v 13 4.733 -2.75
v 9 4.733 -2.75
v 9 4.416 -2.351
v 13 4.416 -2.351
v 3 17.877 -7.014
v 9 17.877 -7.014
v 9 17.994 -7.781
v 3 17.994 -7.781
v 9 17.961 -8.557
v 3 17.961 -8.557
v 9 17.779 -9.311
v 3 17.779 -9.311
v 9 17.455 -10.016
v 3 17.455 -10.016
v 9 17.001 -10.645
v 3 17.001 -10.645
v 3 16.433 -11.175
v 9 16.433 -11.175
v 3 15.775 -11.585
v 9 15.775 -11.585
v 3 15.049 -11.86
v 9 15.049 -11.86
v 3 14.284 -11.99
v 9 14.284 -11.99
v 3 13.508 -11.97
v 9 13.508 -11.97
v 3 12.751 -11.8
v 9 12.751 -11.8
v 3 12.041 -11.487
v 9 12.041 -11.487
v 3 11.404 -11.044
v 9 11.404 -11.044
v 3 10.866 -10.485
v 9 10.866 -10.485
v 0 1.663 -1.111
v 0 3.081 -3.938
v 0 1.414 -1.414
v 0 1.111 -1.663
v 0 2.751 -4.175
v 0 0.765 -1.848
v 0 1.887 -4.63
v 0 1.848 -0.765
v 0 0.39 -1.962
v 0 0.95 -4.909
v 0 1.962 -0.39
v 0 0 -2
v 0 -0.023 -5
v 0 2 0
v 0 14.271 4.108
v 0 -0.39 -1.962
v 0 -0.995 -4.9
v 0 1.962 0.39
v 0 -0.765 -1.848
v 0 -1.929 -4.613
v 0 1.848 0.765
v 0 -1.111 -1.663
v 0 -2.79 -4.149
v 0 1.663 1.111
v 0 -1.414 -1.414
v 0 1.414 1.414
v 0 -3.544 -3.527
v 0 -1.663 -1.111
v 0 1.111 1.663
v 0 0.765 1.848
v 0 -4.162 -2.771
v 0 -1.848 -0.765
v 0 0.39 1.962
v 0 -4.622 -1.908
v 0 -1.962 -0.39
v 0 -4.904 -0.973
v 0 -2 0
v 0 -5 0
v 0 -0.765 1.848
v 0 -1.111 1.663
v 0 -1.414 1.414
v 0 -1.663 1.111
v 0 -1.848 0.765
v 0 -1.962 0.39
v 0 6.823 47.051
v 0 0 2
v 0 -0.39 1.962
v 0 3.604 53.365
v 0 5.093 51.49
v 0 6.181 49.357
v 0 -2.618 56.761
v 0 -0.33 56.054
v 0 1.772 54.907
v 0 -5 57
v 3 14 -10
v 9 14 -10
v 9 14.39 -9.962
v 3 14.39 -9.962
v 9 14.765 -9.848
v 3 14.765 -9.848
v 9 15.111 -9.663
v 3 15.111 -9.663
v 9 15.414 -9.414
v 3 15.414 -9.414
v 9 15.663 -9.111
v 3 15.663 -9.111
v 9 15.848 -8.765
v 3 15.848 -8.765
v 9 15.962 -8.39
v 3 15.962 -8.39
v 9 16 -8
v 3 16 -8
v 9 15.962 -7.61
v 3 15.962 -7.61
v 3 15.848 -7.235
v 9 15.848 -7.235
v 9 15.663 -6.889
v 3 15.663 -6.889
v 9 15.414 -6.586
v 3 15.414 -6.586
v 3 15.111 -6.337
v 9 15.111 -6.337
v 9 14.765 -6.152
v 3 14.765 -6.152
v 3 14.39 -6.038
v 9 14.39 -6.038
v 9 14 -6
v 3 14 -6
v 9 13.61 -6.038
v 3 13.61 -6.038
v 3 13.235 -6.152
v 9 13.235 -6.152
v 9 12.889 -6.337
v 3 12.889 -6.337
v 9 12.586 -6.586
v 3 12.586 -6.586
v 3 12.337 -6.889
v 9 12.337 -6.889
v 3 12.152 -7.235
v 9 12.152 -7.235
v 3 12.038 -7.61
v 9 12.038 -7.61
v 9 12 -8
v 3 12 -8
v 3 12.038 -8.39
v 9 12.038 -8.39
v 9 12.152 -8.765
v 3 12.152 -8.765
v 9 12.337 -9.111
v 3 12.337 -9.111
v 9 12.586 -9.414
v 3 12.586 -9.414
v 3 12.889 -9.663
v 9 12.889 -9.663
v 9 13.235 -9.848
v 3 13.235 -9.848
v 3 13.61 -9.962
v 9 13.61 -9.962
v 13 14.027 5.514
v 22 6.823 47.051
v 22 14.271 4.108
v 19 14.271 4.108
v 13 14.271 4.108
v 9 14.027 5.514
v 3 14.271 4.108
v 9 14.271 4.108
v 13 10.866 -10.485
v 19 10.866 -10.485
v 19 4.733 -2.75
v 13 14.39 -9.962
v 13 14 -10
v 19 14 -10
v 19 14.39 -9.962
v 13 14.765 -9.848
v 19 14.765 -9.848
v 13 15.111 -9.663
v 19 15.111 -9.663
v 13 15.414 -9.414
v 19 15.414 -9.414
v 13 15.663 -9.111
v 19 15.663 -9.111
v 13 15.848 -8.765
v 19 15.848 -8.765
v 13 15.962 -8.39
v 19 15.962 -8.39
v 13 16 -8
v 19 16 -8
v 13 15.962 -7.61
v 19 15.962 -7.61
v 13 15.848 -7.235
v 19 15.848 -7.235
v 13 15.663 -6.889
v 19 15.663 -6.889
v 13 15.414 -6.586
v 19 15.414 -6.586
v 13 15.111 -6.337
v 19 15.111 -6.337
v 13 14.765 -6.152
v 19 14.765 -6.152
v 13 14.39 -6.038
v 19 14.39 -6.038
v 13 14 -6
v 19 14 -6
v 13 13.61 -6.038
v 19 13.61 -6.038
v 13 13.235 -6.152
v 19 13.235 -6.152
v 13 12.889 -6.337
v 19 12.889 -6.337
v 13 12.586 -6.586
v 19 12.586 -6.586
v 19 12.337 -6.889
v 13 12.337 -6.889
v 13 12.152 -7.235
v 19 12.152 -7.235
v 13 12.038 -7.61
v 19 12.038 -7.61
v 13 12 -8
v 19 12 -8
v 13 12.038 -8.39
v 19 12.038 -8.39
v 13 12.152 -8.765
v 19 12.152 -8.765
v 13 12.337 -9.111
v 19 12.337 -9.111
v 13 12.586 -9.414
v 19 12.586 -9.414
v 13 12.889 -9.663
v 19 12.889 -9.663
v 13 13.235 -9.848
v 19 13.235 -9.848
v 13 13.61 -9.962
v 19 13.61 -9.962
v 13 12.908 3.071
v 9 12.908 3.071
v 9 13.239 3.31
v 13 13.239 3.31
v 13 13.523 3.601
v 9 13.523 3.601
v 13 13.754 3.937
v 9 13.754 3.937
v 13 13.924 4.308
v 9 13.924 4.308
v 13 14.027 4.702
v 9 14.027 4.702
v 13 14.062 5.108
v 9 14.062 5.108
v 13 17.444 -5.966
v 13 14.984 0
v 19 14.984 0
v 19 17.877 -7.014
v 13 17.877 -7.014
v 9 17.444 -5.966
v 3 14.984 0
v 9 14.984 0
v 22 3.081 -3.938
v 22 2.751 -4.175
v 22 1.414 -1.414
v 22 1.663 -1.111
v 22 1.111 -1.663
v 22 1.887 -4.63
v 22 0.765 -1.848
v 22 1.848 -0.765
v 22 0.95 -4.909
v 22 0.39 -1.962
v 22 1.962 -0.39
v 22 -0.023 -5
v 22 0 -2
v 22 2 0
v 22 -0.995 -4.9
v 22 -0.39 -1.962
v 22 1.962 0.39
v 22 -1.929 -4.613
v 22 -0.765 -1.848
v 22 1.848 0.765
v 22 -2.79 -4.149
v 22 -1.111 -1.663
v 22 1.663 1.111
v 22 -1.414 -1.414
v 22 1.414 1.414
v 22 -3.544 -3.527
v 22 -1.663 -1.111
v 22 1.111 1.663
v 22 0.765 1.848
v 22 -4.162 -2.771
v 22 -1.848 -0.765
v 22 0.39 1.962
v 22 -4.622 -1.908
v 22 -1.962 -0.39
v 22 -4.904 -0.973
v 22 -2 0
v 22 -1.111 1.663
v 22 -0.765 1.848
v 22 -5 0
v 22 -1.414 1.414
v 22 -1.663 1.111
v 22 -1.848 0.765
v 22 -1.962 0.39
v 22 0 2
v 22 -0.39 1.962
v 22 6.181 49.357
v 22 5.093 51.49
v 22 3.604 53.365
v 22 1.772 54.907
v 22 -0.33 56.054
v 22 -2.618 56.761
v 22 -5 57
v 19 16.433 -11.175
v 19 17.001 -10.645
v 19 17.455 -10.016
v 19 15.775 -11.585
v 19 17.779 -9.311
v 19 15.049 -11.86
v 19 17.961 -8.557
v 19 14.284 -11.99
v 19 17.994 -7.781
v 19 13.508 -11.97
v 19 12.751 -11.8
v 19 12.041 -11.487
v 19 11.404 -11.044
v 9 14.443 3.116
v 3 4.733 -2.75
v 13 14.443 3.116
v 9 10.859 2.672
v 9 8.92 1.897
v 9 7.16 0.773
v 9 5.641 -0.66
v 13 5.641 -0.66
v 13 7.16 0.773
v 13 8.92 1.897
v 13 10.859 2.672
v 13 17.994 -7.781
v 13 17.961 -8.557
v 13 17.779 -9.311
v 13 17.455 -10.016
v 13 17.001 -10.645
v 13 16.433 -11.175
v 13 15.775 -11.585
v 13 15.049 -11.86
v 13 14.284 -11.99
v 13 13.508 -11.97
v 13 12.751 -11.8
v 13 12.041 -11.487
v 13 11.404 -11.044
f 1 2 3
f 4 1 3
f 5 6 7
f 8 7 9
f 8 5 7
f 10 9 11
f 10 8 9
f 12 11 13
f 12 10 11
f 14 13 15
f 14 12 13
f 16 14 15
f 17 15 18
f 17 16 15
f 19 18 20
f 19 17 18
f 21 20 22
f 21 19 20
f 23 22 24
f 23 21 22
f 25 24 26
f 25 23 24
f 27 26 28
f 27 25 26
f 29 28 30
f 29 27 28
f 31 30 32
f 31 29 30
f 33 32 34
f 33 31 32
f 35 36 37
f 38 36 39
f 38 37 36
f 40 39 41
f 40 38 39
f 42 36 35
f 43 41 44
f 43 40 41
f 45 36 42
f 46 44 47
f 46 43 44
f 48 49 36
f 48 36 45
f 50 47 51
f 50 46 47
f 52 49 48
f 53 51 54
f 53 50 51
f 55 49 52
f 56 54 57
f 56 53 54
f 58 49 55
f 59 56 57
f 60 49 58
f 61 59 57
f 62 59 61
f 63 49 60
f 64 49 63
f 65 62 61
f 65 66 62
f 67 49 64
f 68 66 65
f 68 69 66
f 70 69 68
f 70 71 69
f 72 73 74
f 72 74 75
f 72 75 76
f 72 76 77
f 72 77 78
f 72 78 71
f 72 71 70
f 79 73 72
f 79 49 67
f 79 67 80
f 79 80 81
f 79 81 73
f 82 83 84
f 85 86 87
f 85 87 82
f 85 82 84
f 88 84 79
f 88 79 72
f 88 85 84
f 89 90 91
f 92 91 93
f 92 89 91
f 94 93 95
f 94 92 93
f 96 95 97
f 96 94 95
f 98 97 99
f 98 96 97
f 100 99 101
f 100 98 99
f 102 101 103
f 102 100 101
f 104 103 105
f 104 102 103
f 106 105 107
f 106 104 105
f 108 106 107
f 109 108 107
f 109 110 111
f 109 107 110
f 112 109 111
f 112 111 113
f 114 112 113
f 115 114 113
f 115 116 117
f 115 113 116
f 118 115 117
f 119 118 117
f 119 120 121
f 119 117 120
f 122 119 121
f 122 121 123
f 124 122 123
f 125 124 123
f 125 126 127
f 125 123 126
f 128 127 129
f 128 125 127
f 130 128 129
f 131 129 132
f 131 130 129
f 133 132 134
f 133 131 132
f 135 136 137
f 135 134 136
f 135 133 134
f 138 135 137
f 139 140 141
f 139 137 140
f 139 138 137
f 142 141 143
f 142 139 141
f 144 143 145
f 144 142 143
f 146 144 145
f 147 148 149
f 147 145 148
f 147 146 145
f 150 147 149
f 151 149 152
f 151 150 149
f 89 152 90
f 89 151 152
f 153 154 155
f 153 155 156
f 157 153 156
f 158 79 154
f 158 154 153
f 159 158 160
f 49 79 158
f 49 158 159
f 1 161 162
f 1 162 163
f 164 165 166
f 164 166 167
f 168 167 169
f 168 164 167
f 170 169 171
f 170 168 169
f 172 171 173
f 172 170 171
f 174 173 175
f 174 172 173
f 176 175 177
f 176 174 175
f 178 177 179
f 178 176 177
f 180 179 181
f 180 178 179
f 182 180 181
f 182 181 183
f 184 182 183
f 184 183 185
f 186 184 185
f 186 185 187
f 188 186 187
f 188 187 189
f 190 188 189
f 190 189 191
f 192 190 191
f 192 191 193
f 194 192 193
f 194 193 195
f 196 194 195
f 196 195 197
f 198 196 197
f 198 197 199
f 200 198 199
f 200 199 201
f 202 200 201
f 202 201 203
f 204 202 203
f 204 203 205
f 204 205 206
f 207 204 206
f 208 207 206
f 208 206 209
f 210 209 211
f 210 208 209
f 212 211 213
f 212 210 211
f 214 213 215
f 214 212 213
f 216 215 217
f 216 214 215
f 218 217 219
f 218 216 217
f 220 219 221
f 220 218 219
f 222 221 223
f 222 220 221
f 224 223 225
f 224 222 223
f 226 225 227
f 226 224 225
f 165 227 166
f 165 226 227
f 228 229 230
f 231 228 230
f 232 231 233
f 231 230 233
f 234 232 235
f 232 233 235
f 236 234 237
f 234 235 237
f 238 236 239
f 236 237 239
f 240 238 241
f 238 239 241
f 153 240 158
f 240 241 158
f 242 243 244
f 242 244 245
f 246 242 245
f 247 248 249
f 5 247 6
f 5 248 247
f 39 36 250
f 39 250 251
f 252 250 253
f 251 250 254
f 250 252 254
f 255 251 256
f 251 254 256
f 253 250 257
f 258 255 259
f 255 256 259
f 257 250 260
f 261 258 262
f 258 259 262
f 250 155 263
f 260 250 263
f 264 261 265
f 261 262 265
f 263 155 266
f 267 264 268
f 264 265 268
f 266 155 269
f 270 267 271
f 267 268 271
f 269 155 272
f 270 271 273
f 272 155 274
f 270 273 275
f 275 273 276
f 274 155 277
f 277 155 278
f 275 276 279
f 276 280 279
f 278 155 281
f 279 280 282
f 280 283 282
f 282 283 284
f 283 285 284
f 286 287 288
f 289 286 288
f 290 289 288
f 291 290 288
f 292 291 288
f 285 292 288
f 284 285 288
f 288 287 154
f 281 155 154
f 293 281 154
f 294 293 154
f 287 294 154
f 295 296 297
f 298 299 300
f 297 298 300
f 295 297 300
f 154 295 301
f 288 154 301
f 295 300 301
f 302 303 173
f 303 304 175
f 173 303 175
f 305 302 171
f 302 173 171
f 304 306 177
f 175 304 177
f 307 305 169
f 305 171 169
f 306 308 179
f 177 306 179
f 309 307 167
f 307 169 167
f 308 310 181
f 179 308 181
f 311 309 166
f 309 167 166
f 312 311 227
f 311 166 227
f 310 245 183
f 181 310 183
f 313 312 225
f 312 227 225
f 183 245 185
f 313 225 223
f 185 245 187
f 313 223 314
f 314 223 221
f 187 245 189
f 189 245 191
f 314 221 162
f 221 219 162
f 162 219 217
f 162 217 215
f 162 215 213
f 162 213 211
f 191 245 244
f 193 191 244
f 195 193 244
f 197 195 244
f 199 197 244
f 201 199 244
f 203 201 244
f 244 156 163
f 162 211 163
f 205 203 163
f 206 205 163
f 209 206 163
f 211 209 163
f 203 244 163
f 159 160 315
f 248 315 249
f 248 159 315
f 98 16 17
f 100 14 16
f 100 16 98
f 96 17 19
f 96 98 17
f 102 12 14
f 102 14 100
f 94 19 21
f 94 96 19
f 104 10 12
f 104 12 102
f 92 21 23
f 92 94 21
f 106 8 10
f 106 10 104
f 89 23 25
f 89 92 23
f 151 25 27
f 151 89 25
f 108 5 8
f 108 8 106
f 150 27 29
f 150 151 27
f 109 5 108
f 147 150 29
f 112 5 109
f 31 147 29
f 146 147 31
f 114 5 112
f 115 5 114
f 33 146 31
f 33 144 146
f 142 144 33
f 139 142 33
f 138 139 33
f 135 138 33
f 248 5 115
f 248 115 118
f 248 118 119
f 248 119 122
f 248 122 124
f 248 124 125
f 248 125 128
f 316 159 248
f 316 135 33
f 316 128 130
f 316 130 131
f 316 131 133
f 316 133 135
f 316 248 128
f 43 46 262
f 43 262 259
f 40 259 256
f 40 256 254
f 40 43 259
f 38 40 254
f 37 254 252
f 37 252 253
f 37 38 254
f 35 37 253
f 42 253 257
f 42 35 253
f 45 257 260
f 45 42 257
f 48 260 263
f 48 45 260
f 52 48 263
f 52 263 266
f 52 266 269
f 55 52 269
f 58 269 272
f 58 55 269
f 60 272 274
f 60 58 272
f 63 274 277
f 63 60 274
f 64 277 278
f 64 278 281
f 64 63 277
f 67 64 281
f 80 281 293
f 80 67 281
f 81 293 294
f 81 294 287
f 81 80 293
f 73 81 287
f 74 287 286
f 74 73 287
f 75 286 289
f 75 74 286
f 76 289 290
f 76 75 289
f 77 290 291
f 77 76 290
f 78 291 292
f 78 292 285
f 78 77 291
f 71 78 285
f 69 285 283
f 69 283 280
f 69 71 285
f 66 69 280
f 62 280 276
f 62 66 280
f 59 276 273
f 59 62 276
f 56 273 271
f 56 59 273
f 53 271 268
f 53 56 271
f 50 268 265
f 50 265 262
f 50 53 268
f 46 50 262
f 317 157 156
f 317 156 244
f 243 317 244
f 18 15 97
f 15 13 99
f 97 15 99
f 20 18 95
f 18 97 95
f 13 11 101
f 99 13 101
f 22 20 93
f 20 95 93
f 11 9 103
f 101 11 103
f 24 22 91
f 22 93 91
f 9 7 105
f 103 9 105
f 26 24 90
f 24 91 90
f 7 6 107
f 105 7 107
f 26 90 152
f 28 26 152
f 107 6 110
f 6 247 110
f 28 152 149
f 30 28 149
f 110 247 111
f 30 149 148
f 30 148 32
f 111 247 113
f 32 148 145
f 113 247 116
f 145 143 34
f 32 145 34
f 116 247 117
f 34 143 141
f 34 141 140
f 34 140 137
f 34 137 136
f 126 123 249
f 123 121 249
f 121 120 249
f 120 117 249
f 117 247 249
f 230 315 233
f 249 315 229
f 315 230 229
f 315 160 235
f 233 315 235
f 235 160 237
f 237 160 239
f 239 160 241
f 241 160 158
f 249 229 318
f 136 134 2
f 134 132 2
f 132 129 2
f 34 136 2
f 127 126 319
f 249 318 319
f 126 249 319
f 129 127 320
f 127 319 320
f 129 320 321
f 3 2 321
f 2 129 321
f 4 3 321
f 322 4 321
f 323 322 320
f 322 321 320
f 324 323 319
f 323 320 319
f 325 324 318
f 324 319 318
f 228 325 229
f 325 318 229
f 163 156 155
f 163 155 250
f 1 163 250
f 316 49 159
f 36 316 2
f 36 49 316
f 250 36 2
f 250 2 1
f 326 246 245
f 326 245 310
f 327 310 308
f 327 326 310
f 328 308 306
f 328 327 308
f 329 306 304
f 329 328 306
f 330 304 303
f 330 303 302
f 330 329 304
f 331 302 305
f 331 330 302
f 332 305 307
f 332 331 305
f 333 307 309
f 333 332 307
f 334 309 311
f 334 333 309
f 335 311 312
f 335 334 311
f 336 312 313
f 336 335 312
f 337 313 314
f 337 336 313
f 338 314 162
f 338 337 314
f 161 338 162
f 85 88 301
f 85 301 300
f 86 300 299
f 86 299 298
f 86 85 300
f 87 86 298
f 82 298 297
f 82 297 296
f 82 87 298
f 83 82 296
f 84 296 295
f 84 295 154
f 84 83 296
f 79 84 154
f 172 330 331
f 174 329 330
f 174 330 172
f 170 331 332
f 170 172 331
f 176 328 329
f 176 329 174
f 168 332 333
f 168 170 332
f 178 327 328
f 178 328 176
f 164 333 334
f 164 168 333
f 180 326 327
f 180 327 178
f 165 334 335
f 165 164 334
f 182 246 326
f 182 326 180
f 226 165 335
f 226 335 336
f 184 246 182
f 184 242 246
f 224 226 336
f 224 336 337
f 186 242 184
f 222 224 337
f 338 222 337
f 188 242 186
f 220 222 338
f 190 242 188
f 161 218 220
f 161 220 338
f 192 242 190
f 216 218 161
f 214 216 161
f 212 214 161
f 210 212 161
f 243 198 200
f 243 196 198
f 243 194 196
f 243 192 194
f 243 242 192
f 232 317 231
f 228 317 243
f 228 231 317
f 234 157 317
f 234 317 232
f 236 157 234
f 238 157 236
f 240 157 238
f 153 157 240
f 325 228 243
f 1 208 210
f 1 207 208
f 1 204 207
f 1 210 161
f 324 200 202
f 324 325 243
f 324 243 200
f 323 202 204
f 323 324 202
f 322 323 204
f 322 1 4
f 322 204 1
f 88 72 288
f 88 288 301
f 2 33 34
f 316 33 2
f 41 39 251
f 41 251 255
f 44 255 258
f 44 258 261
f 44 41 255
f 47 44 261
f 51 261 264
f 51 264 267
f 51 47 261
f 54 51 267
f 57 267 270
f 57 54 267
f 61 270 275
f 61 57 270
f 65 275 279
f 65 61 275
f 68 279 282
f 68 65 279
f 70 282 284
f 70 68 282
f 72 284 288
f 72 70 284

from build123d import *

# Parameters (mm, degrees)
SKETCH2_R                = 2
BOSS_EXTRUDE1_DEPTH      = 22
BOSS_EXTRUDE2_DEPTH      = 8
BOSS_EXTRUDE2_DEPTH_BACK = 8
SKETCH5_R                = 2
CUT_EXTRUDE1_DEPTH       = 2
CUT_EXTRUDE1_DEPTH_BACK  = 2


with BuildPart() as part:
    # Sketch2 → Boss-Extrude1 (new body)
    with BuildSketch(Plane.YZ):
        with BuildLine():
            Line((14.2713029, 4.10781366), (3.081429665, -3.937612376))
            Line((3.081429665, -3.937612376), (2.751400089, -4.174900903))
            ThreePointArc((2.751400089, -4.174900903), (-2.370970219, -4.402101796), (-5, 0))
            Line((-5, 0), (-5, 57))
            ThreePointArc((-5, 57), (2.726338919, 54.181703922), (6.823492726, 47.050614486))
            Line((6.823492726, 47.050614486), (14.2713029, 4.10781366))
        make_face()
        with Locations(Location((0, 0, 0), (0, 0, 270))):
            Circle(SKETCH2_R, mode=Mode.SUBTRACT)
    extrude(amount=BOSS_EXTRUDE1_DEPTH)

    # Sketch5 → Boss-Extrude2 (add, two sides: drawn at the far end of the back side and taken through both)
    with BuildSketch(Plane.YZ.offset(11).offset(-BOSS_EXTRUDE2_DEPTH_BACK)):
        with BuildLine():
            Line((14.2713029, 4.10781366), (14.983744003, 0))
            Line((14.983744003, 0), (17.876610129, -7.014153205))
            ThreePointArc((17.876610129, -7.014153205), (15.774722197, -11.584740035), (10.865645594, -10.48512021))
            Line((10.865645594, -10.48512021), (4.732907846, -2.750213262))
            Line((4.732907846, -2.750213262), (14.2713029, 4.10781366))
        make_face()
        with Locations(Location((14, -8, 0), (0, 0, 270))):
            Circle(SKETCH5_R, mode=Mode.SUBTRACT)
    extrude(amount=BOSS_EXTRUDE2_DEPTH + BOSS_EXTRUDE2_DEPTH_BACK)

    # Sketch6 → Cut-Extrude1 (cut, two sides: drawn at the far end of the back side and taken through both)
    with BuildSketch(Plane.YZ.offset(11).offset(-CUT_EXTRUDE1_DEPTH_BACK)):
        with BuildLine():
            Line((14.027483372, 5.513635398), (14.4433748, 3.11567649))
            Line((14.4433748, 3.11567649), (14.983744003, 0))
            Line((14.983744003, 0), (17.444478514, -5.966390458))
            ThreePointArc((17.444478514, -5.966390458), (16.264679643, -11.297154245), (10.865645594, -10.48512021))
            Line((10.865645594, -10.48512021), (4.41644607, -2.351076288))
            ThreePointArc((4.41644607, -2.351076288), (8.013457441, 1.376361406), (12.908459217, 3.070834826))
            ThreePointArc((12.908459217, 3.070834826), (13.846657415, 4.118762533), (14.027483372, 5.513635398))
        make_face()
    extrude(amount=CUT_EXTRUDE1_DEPTH + CUT_EXTRUDE1_DEPTH_BACK, mode=Mode.SUBTRACT)


solid = part.part
